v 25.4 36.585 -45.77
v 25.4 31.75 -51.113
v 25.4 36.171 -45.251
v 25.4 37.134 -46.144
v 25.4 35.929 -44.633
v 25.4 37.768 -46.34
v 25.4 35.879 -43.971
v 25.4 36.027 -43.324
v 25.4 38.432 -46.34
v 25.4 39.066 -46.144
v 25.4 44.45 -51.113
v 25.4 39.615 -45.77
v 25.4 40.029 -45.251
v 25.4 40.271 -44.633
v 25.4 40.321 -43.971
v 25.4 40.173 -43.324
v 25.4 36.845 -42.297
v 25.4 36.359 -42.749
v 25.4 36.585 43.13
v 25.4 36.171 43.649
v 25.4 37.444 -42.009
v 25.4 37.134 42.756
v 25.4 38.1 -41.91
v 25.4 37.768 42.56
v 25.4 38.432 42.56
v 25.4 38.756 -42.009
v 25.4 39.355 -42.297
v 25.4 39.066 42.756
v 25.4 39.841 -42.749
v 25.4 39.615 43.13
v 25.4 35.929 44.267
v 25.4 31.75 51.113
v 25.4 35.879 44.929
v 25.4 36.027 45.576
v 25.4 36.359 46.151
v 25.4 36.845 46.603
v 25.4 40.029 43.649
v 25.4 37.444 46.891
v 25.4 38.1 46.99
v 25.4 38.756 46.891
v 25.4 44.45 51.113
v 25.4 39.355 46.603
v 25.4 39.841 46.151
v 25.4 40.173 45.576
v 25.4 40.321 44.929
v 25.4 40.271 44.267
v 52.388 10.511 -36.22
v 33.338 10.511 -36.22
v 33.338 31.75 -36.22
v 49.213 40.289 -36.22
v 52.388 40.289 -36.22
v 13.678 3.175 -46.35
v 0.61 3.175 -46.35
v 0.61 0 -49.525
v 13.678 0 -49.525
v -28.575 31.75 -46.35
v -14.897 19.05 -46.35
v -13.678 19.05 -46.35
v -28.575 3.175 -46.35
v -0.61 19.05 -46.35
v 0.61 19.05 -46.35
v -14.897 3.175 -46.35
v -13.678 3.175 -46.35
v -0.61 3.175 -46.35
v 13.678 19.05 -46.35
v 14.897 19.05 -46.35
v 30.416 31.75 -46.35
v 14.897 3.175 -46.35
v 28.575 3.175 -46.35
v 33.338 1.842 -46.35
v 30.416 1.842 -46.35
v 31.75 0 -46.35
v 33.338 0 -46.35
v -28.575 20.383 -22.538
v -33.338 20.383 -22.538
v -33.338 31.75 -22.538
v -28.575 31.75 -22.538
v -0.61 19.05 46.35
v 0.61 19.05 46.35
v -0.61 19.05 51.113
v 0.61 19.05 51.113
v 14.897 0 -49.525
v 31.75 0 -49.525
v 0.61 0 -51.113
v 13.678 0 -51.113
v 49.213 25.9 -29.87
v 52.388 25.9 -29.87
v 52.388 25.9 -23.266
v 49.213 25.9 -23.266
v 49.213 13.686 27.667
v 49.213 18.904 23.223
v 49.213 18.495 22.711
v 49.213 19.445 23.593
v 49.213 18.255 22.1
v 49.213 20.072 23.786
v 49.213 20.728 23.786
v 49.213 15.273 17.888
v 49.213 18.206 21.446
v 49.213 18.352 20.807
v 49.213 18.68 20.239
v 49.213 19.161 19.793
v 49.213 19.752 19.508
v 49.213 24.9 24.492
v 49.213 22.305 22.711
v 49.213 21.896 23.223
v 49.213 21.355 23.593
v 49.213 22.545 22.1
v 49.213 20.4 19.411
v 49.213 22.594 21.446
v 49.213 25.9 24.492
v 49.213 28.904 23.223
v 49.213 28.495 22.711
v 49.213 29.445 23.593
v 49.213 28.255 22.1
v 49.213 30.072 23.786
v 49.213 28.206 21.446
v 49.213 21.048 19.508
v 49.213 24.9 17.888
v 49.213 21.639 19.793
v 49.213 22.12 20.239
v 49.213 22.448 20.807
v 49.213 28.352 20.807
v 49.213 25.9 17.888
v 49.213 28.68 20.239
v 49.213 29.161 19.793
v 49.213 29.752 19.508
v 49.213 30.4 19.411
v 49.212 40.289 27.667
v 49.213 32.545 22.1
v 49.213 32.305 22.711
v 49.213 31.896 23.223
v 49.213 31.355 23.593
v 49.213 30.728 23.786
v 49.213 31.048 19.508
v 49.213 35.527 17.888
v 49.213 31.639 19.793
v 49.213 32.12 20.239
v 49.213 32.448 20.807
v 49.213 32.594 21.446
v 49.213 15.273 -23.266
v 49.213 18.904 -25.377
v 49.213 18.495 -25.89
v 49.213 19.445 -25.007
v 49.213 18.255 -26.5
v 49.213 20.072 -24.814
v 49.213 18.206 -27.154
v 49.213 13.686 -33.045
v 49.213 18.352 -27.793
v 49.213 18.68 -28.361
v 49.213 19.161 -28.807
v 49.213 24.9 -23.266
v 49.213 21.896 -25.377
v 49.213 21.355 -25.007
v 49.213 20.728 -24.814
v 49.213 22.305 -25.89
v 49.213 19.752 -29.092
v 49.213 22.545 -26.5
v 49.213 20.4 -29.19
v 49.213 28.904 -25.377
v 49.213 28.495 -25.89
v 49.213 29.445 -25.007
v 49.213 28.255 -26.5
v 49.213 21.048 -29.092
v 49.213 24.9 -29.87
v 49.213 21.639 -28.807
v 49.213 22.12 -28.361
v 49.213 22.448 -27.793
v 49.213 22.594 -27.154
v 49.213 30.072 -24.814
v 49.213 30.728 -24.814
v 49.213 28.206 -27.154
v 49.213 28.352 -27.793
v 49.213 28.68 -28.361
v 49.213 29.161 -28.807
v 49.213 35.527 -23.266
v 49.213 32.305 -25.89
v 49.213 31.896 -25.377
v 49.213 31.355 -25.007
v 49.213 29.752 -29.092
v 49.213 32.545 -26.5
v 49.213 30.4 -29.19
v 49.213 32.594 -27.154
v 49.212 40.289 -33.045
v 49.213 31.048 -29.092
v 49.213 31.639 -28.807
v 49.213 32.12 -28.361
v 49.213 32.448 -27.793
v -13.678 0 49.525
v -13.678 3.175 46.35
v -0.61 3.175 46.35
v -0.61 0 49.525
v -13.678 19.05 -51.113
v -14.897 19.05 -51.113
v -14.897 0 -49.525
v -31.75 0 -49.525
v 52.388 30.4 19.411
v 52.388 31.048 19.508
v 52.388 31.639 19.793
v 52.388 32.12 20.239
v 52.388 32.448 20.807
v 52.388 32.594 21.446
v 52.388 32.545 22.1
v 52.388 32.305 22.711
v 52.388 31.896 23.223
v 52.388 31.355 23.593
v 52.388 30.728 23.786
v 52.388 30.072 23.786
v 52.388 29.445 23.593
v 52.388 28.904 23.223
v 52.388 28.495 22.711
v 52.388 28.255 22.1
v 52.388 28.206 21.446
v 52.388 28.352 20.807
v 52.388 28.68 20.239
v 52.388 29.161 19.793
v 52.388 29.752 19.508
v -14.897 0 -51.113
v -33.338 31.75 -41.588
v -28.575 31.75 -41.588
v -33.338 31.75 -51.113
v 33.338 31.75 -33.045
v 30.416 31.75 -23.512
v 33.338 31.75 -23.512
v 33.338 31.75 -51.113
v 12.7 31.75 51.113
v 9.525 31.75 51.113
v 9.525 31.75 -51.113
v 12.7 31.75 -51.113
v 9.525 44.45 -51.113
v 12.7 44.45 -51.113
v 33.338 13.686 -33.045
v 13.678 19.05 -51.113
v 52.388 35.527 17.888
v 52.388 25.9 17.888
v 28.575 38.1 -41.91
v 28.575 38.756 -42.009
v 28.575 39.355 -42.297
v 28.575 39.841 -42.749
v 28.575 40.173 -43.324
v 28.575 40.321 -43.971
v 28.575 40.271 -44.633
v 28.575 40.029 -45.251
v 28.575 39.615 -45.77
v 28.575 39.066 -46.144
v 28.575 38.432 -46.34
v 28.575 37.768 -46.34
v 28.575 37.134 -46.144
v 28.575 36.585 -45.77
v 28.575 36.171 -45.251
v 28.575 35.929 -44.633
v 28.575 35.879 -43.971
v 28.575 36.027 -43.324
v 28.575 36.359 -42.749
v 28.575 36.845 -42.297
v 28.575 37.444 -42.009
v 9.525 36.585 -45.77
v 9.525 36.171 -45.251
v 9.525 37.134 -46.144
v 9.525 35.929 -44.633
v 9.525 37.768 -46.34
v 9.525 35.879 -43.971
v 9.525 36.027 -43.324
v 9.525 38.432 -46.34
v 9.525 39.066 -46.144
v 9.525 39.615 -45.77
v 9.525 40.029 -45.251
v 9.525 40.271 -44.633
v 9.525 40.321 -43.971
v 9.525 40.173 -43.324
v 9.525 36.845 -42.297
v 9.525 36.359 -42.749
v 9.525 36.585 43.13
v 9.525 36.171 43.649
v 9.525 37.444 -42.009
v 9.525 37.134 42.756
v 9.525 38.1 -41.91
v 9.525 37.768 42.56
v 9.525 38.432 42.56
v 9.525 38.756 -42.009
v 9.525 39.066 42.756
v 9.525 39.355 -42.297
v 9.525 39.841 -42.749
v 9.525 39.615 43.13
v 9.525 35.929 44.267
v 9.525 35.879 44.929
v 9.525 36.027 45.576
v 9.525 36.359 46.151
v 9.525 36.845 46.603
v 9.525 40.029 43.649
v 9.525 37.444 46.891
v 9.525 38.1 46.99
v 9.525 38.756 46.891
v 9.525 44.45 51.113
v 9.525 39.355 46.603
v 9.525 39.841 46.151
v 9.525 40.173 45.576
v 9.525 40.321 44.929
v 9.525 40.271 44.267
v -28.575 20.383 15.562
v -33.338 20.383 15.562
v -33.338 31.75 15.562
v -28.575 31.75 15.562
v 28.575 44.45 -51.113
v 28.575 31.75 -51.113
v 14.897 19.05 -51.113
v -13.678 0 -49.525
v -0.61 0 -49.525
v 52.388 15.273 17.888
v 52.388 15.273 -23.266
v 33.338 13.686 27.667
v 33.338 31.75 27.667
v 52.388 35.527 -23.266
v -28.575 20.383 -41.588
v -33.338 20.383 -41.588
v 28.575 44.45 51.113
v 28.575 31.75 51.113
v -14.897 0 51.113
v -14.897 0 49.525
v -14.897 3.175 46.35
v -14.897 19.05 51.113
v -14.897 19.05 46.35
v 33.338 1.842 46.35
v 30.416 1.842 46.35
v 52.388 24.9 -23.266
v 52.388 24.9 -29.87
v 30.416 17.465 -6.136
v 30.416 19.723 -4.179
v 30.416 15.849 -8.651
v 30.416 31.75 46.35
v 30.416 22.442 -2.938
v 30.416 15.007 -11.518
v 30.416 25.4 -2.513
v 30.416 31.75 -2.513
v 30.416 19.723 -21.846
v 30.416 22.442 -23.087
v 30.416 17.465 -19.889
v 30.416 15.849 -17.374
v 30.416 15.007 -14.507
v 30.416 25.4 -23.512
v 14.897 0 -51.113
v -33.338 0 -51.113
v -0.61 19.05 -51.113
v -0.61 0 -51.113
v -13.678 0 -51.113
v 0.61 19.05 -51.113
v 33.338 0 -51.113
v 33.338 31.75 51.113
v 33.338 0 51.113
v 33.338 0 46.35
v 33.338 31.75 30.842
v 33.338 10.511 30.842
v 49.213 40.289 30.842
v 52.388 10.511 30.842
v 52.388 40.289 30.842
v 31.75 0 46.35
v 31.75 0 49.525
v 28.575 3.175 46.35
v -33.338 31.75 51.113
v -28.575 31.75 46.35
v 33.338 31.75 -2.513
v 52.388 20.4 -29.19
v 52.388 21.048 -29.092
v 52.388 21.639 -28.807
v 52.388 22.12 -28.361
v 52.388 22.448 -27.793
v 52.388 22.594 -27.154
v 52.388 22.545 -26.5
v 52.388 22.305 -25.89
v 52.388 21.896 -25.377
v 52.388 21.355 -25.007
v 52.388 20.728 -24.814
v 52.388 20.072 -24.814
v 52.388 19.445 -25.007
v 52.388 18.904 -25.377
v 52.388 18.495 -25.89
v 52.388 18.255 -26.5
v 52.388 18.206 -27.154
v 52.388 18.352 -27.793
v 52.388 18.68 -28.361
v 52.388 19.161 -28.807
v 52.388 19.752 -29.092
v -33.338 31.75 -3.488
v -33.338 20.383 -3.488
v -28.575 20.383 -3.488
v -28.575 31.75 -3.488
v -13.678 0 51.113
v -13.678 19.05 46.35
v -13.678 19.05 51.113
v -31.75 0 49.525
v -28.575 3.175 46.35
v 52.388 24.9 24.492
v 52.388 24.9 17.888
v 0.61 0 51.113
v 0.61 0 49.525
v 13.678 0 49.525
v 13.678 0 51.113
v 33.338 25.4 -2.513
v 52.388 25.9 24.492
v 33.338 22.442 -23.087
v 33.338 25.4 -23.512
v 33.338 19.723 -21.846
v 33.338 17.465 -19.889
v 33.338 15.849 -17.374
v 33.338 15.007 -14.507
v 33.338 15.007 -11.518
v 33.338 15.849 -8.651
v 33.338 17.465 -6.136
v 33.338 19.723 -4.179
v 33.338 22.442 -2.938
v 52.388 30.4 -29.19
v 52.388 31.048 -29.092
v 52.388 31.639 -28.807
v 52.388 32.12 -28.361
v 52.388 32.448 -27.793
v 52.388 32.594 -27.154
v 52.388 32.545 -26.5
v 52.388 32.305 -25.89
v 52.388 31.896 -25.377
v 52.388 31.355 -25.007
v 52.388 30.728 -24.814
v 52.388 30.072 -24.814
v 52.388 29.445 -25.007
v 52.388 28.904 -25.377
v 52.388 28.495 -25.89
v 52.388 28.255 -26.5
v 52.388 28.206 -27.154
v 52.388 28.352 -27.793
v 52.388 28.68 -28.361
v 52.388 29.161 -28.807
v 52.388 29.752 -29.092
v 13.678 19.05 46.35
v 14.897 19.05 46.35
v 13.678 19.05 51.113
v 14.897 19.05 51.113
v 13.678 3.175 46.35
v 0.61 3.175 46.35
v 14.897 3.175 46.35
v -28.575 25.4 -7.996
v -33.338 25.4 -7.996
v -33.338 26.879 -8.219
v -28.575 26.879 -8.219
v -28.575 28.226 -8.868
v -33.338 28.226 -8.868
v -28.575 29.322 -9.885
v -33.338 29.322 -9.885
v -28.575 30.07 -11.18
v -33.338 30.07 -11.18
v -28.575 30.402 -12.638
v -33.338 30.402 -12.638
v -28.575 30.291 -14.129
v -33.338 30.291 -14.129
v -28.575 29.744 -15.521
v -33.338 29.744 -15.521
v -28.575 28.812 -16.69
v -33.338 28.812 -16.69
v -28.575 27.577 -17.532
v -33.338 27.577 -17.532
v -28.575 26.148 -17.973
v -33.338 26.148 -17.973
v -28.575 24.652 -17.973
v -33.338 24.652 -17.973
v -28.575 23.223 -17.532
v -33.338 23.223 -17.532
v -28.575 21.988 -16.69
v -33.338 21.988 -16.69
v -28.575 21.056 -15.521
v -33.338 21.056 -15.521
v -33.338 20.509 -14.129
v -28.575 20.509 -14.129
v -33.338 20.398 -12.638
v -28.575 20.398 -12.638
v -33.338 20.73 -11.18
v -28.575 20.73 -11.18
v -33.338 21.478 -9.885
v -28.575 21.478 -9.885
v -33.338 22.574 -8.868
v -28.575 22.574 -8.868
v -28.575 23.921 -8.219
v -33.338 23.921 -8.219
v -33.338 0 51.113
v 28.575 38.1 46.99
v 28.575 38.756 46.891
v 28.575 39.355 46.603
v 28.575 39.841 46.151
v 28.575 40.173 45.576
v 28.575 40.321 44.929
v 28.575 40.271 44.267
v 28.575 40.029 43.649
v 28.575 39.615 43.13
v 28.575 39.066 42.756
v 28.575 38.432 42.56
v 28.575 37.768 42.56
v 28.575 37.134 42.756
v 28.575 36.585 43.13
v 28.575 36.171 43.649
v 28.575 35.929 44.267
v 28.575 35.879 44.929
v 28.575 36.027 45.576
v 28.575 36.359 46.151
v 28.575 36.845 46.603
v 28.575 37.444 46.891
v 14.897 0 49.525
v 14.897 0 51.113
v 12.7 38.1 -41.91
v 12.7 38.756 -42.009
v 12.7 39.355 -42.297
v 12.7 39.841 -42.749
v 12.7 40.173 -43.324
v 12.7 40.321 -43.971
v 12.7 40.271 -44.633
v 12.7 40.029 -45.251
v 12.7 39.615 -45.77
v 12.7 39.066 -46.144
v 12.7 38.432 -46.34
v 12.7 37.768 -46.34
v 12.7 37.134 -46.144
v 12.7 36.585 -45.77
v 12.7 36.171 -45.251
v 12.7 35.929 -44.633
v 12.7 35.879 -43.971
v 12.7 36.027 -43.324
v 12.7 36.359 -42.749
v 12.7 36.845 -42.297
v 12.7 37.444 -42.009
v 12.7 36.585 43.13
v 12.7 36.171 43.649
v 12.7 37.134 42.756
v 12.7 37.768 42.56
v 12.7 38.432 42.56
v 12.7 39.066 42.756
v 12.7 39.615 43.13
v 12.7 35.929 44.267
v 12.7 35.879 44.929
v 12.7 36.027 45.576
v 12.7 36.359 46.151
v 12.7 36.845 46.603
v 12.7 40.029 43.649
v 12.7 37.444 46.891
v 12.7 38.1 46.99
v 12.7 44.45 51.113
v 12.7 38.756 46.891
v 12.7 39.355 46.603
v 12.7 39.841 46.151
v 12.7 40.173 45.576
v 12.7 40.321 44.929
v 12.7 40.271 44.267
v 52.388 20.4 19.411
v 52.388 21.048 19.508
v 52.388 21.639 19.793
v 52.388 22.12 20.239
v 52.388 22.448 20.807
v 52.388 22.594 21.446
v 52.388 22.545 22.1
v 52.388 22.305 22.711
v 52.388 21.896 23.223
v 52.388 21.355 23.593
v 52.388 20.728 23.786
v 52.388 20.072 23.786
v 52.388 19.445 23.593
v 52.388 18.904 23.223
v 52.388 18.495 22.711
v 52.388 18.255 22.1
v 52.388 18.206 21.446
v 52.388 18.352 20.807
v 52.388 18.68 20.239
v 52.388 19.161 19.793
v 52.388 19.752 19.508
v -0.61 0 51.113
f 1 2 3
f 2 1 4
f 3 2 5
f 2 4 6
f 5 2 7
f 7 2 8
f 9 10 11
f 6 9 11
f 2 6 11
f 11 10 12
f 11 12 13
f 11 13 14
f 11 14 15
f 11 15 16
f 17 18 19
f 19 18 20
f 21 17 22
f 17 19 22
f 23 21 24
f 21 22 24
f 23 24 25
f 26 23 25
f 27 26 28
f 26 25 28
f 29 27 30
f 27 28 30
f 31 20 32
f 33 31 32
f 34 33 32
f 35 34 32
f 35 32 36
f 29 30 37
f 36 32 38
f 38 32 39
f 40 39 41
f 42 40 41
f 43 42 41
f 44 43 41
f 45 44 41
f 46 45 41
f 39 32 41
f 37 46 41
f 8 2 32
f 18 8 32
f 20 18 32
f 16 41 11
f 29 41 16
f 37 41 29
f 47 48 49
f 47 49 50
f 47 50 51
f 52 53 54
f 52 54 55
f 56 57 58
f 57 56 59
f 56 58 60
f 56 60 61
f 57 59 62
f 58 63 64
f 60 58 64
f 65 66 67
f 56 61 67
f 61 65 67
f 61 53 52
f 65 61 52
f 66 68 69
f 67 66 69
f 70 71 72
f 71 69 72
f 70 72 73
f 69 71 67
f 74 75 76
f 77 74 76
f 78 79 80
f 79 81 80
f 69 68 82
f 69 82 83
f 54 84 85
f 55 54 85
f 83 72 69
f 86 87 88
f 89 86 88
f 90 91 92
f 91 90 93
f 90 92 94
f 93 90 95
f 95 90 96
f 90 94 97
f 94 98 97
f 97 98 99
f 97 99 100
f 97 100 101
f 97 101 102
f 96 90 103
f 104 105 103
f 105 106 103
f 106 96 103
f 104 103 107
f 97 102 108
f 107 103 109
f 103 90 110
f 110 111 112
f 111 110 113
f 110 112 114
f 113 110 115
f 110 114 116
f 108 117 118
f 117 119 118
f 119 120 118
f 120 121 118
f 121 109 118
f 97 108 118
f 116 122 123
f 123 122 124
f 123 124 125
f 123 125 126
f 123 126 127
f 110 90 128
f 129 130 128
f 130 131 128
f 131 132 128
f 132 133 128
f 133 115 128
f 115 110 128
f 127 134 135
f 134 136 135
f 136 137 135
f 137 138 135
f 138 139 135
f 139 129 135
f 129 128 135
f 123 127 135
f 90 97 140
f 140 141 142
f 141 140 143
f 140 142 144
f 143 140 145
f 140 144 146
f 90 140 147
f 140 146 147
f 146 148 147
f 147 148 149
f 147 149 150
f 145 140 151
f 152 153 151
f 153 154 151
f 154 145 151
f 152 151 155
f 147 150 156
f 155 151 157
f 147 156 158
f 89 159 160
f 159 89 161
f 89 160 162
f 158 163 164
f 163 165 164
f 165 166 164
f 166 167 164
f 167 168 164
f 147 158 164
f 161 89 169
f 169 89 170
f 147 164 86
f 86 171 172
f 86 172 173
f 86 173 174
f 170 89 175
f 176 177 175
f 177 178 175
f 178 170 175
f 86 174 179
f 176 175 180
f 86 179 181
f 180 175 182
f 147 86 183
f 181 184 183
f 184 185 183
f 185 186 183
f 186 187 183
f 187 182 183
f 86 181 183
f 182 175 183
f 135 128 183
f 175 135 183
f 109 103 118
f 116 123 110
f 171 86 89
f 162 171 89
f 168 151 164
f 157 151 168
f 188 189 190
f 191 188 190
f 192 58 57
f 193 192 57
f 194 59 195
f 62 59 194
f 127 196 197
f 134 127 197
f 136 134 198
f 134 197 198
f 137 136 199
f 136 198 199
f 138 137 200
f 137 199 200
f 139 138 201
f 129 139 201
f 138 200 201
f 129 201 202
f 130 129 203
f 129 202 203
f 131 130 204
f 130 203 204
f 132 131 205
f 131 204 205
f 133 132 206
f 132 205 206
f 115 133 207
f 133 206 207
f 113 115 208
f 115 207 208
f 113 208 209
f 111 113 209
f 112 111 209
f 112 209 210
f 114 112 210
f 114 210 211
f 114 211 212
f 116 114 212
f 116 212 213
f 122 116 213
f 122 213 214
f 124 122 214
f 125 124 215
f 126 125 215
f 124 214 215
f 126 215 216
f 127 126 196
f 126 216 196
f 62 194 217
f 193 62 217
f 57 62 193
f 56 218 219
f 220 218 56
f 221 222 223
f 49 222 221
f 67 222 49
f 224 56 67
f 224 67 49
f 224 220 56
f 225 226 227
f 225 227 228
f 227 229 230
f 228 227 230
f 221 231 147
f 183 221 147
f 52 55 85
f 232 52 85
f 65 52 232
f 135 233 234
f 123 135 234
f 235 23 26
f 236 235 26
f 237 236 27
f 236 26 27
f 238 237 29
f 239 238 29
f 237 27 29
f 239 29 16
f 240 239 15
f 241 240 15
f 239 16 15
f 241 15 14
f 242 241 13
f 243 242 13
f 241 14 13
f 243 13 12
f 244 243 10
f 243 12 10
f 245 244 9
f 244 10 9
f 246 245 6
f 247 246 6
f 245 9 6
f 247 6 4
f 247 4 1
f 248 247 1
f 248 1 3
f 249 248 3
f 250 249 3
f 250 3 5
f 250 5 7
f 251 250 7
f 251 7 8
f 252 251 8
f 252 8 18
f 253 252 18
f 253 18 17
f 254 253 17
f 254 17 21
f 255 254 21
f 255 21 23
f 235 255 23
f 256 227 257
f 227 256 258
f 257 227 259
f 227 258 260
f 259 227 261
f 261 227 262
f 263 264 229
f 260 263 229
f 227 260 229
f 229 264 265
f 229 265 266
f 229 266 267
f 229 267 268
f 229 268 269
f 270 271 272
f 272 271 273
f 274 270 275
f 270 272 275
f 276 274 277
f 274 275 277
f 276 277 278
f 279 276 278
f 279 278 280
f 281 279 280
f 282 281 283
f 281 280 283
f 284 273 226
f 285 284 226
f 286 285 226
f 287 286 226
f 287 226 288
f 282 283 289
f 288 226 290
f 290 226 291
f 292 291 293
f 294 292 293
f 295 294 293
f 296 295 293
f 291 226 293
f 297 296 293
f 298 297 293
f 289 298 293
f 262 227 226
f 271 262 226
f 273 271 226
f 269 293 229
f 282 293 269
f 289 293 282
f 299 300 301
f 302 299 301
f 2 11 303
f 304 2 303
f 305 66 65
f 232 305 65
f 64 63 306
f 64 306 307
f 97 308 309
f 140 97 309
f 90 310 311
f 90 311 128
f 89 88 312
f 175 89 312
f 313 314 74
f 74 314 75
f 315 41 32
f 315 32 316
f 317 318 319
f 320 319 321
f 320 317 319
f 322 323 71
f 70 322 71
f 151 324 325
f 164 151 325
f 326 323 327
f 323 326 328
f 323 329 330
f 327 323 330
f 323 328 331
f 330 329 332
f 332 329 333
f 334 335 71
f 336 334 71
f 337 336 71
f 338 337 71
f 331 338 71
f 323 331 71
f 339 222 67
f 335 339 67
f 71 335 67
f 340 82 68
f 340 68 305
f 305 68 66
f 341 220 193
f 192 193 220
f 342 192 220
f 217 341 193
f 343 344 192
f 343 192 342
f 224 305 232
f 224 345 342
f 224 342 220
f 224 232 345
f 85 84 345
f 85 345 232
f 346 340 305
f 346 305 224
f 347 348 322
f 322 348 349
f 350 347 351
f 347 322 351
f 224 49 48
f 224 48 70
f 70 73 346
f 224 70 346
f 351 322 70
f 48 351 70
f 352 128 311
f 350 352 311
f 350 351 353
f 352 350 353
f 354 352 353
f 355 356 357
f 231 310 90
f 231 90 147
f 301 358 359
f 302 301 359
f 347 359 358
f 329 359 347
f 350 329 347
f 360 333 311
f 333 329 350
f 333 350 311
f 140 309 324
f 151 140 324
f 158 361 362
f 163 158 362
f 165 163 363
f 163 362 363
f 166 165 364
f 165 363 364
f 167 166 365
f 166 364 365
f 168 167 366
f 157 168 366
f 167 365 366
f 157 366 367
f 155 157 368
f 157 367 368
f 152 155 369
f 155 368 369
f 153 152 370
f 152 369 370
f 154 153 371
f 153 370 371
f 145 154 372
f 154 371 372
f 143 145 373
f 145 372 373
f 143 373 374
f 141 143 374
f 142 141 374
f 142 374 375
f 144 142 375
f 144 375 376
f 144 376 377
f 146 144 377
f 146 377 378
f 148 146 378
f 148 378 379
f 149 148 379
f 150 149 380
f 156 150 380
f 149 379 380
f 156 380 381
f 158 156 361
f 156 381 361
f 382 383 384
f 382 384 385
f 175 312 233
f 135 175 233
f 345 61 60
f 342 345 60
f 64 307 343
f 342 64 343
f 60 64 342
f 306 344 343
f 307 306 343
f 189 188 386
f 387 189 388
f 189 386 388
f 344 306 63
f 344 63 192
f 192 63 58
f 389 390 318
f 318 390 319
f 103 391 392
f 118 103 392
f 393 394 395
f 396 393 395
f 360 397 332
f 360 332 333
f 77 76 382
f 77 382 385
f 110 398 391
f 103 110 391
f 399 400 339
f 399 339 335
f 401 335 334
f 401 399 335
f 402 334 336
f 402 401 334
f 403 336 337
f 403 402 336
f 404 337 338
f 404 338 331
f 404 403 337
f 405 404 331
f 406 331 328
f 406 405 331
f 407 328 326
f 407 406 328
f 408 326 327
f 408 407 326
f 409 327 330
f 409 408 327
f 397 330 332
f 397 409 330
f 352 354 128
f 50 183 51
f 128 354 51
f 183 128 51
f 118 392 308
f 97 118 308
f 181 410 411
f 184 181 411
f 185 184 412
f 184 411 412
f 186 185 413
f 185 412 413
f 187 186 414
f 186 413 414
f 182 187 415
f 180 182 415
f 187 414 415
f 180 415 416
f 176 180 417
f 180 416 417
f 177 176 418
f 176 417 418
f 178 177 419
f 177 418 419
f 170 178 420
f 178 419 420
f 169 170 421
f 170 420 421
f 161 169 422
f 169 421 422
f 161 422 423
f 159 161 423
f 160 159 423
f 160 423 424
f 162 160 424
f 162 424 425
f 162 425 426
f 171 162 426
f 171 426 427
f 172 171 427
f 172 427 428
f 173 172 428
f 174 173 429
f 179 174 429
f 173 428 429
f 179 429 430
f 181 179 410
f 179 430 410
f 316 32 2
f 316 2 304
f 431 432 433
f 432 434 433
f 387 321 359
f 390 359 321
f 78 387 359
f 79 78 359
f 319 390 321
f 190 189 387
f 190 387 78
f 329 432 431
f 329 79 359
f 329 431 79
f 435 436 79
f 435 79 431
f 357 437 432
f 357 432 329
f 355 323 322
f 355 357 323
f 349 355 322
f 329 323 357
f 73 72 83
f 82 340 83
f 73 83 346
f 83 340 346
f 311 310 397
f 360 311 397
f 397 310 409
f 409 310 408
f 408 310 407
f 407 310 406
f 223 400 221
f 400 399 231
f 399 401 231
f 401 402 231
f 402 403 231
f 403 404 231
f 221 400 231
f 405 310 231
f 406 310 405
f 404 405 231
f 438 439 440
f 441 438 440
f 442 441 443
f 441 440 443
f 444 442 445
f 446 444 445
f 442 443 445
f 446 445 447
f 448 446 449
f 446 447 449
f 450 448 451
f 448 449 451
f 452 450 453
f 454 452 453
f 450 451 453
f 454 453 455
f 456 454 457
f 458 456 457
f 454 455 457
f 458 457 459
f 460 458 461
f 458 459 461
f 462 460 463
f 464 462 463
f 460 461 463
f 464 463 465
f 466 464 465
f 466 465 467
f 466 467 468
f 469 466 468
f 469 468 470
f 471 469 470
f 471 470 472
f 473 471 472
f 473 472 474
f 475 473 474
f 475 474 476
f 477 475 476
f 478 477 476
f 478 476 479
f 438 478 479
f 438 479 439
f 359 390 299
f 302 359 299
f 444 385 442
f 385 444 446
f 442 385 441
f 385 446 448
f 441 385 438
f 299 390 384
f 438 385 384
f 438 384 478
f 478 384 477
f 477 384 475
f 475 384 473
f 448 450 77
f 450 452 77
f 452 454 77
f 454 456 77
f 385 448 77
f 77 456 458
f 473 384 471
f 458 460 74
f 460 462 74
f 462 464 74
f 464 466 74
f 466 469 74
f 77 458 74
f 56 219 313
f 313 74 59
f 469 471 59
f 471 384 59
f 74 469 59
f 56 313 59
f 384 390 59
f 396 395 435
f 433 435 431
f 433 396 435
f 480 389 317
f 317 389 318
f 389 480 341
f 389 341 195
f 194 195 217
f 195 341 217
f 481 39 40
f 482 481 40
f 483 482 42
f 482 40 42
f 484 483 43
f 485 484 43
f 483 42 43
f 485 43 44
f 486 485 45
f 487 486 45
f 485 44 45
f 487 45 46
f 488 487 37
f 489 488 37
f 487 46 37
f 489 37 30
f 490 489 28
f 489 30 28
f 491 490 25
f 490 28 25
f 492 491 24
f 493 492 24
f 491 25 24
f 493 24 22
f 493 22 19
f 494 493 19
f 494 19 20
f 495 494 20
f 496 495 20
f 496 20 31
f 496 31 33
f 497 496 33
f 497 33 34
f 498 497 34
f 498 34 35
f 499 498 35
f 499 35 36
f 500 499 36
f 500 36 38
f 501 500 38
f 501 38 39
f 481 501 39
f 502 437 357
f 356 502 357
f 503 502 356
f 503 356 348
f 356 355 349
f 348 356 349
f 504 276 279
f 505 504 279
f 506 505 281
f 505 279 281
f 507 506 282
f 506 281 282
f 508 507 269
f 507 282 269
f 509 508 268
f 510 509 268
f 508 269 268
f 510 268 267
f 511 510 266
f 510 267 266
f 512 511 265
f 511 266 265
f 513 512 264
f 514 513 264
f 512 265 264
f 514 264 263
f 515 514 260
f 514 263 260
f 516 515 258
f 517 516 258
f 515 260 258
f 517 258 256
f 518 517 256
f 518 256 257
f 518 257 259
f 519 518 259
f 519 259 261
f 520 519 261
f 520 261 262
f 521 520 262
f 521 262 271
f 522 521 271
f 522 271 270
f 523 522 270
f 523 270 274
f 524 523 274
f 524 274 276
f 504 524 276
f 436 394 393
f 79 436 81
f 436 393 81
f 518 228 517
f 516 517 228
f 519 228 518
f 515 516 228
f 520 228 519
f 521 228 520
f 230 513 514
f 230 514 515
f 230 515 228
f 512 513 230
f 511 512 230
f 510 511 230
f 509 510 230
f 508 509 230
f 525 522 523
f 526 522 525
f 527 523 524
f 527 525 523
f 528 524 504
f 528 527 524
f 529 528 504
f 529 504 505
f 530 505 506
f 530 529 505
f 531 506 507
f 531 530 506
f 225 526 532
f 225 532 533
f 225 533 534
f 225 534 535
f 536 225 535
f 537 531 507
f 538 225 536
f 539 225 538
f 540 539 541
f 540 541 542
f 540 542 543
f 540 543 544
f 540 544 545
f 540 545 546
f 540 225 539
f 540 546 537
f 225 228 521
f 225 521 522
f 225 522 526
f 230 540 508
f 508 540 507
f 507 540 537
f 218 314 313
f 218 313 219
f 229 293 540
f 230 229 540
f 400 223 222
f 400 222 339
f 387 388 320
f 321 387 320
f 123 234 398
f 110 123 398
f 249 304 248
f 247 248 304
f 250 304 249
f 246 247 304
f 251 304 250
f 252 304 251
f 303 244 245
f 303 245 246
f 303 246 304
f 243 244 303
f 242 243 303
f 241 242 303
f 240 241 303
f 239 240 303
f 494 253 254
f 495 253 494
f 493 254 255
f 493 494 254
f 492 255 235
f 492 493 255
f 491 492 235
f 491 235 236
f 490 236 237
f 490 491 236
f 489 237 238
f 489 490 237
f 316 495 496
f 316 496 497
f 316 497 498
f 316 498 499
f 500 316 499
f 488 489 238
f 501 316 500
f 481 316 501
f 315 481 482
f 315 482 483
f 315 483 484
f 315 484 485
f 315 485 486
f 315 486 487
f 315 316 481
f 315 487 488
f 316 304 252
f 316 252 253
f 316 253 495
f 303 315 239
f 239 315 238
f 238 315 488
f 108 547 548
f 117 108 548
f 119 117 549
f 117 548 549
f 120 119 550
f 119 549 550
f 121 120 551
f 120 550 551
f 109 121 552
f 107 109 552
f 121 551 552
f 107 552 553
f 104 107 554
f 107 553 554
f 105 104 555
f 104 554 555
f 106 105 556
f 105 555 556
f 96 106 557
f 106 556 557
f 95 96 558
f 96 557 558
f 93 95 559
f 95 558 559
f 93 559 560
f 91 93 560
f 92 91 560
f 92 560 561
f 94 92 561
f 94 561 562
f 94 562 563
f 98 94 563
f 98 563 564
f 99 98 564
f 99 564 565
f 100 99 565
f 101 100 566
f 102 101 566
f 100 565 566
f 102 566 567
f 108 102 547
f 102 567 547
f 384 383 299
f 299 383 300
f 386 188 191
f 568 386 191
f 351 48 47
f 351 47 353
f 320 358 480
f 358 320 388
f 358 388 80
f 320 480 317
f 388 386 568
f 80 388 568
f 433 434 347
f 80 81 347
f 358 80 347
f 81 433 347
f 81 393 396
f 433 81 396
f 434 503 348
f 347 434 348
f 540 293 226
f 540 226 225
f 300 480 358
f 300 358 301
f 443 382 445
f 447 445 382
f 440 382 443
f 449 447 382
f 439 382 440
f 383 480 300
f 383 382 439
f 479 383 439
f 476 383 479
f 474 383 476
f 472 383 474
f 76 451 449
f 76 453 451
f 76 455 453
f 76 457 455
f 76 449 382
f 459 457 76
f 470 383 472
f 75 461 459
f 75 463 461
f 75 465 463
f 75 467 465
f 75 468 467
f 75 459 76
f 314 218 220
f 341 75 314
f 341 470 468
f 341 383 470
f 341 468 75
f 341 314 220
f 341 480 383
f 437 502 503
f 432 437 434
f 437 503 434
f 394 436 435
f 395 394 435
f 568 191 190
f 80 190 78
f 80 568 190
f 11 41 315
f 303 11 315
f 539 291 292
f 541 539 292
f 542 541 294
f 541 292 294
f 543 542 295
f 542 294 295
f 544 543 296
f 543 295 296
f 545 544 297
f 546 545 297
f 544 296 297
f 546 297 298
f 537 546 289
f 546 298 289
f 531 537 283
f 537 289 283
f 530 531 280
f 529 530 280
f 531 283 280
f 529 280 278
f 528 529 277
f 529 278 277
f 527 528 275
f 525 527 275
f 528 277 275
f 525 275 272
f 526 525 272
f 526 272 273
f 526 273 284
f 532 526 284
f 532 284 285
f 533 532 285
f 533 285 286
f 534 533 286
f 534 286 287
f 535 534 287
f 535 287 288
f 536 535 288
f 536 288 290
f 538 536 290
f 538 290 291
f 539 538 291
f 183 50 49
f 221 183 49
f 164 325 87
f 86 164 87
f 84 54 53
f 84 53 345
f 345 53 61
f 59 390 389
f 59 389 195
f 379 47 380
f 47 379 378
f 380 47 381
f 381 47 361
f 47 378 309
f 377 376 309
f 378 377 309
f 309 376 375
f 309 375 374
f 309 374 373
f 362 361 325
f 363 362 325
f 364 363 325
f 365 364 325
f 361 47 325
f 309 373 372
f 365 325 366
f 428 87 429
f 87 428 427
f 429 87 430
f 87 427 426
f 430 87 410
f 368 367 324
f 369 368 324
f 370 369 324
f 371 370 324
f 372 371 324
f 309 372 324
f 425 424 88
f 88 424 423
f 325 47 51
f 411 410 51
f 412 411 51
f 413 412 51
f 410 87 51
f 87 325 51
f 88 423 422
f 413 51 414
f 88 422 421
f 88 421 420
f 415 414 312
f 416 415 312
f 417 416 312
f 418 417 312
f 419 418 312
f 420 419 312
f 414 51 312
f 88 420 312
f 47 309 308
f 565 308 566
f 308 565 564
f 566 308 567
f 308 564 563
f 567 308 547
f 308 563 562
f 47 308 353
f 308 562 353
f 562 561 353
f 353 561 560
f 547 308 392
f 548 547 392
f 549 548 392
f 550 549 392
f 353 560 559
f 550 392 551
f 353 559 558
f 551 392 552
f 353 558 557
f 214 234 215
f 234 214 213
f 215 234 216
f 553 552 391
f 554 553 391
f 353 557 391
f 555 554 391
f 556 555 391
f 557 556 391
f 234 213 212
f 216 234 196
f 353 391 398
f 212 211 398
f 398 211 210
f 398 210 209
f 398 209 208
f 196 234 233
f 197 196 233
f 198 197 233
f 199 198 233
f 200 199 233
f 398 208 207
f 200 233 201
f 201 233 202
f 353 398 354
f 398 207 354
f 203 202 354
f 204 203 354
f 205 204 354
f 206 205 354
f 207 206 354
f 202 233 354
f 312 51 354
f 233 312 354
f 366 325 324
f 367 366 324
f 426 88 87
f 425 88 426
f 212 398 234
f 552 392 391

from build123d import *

# Parameters (mm, degrees)
SKETCH4_W               = 66.675
SKETCH4_H               = 102.22500002
SKETCH4_W_2             = 57.15
SKETCH4_H_2             = 92.70000002
BOSS_EXTRUDE1_DEPTH     = 19.05
BOSS_EXTRUDE2_START     = 19.05
SKETCH5_W               = 66.675
SKETCH5_H               = 102.22500002
BOSS_EXTRUDE2_DEPTH     = 12.7
FILLET1_SIZE            = 3.175
SKETCH6_W               = 1.2192
SKETCH6_H               = 19.05
CUT_EXTRUDE_THIN1_DEPTH = 118.182461581
SKETCH8_W               = 3.175
SKETCH8_H               = 12.7
BOSS_EXTRUDE3_DEPTH     = 102.22500002
BOSS_EXTRUDE3_2_DEPTH   = 102.22500002
SKETCH9_R               = 2.226999991
CUT_EXTRUDE2_DEPTH      = 81.159117158
SKETCH14_W              = 57.15
SKETCH14_H              = 92.70000002
CUT_EXTRUDE8_DEPTH      = 12.7
SKETCH26_W              = 1.8415
SKETCH26_H              = 92.70000002
CUT_EXTRUDE11_DEPTH     = 69.789091167
CUT_EXTRUDE12_START     = -2.921
SKETCH27_W              = 92.70000002
SKETCH27_H              = 1.8415
CUT_EXTRUDE12_DEPTH     = 2.921
SKETCH30_R              = 5.0165
CUT_EXTRUDE13_DEPTH     = 96.046545346
CUT_EXTRUDE16_DEPTH     = 2.921
BOSS_EXTRUDE4_DEPTH     = 19.05
SKETCH34_W              = 67.061999988
SKETCH34_H              = 29.778999878
BOSS_EXTRUDE5_DEPTH     = 3.175
CUT_EXTRUDE17_START     = 19.05
SKETCH32_R              = 2.200000045
CUT_EXTRUDE17_DEPTH     = 3.175
BOSS_EXTRUDE6_DEPTH     = 3.175
BOSS_EXTRUDE8_START     = 27.666500001
BOSS_EXTRUDE8_DEPTH     = 3.175
SKETCH36_W              = 19.05
SKETCH36_H              = 11.3665
CUT_EXTRUDE18_DEPTH     = 4.7625


# Read off the part's stored shape, not the designer's step: Boss-Extrude8
with BuildPart() as part:
    # Sketch4 → Boss-Extrude1 (new body)
    with BuildSketch(Plane(origin=(0, 0, 0), x_dir=(1, 0, 0), z_dir=(0, 1, 0))):
        Rectangle(SKETCH4_W, SKETCH4_H)
        Rectangle(SKETCH4_W_2, SKETCH4_H_2, mode=Mode.SUBTRACT)
    extrude(amount=BOSS_EXTRUDE1_DEPTH)

    # Sketch5 → Boss-Extrude2 (add)
    with BuildSketch(Plane(origin=(0, 0, 0), x_dir=(1, 0, 0), z_dir=(0, 1, 0)).offset(BOSS_EXTRUDE2_START)):
        Rectangle(SKETCH5_W, SKETCH5_H)
    extrude(amount=BOSS_EXTRUDE2_DEPTH)

    # Fillet1
    fillet1_edges = [part.edges().sort_by_distance(p)[0] for p in [
        (-28.575, 0, 0),
        (0, 0, 46.35000001),
        (28.575, 0, 0),
        (0, 0, -46.35000001),
    ]]
    chamfer(fillet1_edges, length=FILLET1_SIZE)

    # Sketch6 → Cut-Extrude-Thin1 (cut, through all)
    with BuildSketch(Plane(origin=(14.34600001, 0, 51.11250001), x_dir=(-1, 0, 0), z_dir=(0, 0, -1))):
        with Locations((14.34600001, 9.525)):
            Rectangle(SKETCH6_W, SKETCH6_H)
        with Locations((28.63350001, 9.525)):
            Rectangle(SKETCH6_W, SKETCH6_H)
        with Locations((0.05850001, 9.525)):
            Rectangle(SKETCH6_W, SKETCH6_H)
    extrude(amount=CUT_EXTRUDE_THIN1_DEPTH, mode=Mode.SUBTRACT)

    # Sketch14 → Cut-Extrude8 (cut)
    with BuildSketch(Plane.XZ.offset(-19.05)):
        Rectangle(SKETCH14_W, SKETCH14_H)
    extrude(amount=-CUT_EXTRUDE8_DEPTH, mode=Mode.SUBTRACT)

    # Sketch26 → Cut-Extrude11 (cut, through all)
    with BuildSketch(Plane(origin=(0, 31.75, 0), x_dir=(1, 0, 0), z_dir=(0, 1, 0))):
        with Locations((29.49575, 0)):
            Rectangle(SKETCH26_W, SKETCH26_H)
    extrude(amount=-CUT_EXTRUDE11_DEPTH, mode=Mode.SUBTRACT)

    # Sketch27 → Cut-Extrude12 (cut)
    with BuildSketch(Plane(origin=(33.3375, 0, 0), x_dir=(0, 0, -1), z_dir=(1, 0, 0)).offset(CUT_EXTRUDE12_START)):
        with Locations((0, 0.92075)):
            Rectangle(SKETCH27_W, SKETCH27_H)
    extrude(amount=CUT_EXTRUDE12_DEPTH, mode=Mode.SUBTRACT)

    # Sketch30 → Cut-Extrude13 (cut, through all)
    with BuildSketch(Plane.ZY.offset(33.3375)):
        with Locations((-13.01250001, 25.4)):
            Circle(SKETCH30_R)
    extrude(amount=-CUT_EXTRUDE13_DEPTH, mode=Mode.SUBTRACT)

    # Sketch31 → Cut-Extrude16 (cut)
    with BuildSketch(Plane(origin=(33.3375, 0, 0), x_dir=(0, 0, -1), z_dir=(1, 0, 0))):
        with BuildLine():
            Line((2.512500055, 25.4), (2.512500055, 31.75))
            Line((2.512500055, 31.75), (23.512499965, 31.75))
            Line((23.512499965, 31.75), (23.512499965, 25.4))
            ThreePointArc((23.512499965, 25.4), (13.01250001, 14.900000045), (2.512500055, 25.4))
        make_face()
    extrude(amount=-CUT_EXTRUDE16_DEPTH, mode=Mode.SUBTRACT)

    # Sketch33 → Boss-Extrude4 (add)
    with BuildSketch(Plane(origin=(33.3375, 0, 0), x_dir=(0, 0, -1), z_dir=(1, 0, 0))):
        Polygon((-27.666500001, 31.75), (-27.666500001, 13.685500057), (33.045499987, 13.685500057), (33.045499987, 31.75), (36.220499987, 31.75), (36.220499987, 10.510500057), (-30.841500001, 10.510500057), (-30.841500001, 31.75), align=None)
    extrude(amount=BOSS_EXTRUDE4_DEPTH)

    # Sketch34 → Boss-Extrude5 (add)
    with BuildSketch(Plane(origin=(52.3875, 0, 0), x_dir=(0, 0, -1), z_dir=(1, 0, 0))):
        with Locations((2.689499993, 25.399999996)):
            Rectangle(SKETCH34_W, SKETCH34_H)
    extrude(amount=-BOSS_EXTRUDE5_DEPTH)

    # Sketch32 → Cut-Extrude17 (cut)
    with BuildSketch(Plane(origin=(33.3375, 0, 0), x_dir=(0, 0, -1), z_dir=(1, 0, 0)).offset(CUT_EXTRUDE17_START)):
        with Locations((26.989500034, 30.400000029)):
            Circle(SKETCH32_R)
        with Locations((26.989500034, 20.399999963)):
            Circle(SKETCH32_R)
        with Locations((-21.610500048, 30.400000029)):
            Circle(SKETCH32_R)
        with Locations((-21.610500048, 20.399999963)):
            Circle(SKETCH32_R)
        Polygon((23.266499987, 15.273000057), (23.266499987, 24.899999996), (29.870499987, 24.899999996), (29.870499987, 25.899999996), (23.266499987, 25.899999996), (23.266499987, 35.526999935), (-17.887500001, 35.526999935), (-17.887500001, 25.899999996), (-24.491500001, 25.899999996), (-24.491500001, 24.899999996), (-17.887500001, 24.899999996), (-17.887500001, 15.273000057), align=None)
    extrude(amount=-CUT_EXTRUDE17_DEPTH, mode=Mode.SUBTRACT)

    # Sketch35 → Boss-Extrude6 (add)
    with BuildSketch(Plane(origin=(0, 0, -36.220499987), x_dir=(-1, 0, 0), z_dir=(0, 0, -1))):
        Polygon((-49.2125, 40.289499935), (-33.3375, 31.75), (-49.2125, 31.75), align=None)
    extrude(amount=-BOSS_EXTRUDE6_DEPTH)

    # Boss-Extrude8 outline → Boss-Extrude8 (add)
    with BuildSketch(Plane.XY.offset(BOSS_EXTRUDE8_START)):
        Polygon((49.2125, 40.289499935), (33.3375, 31.75), (49.2125, 31.75), align=None)
    extrude(amount=BOSS_EXTRUDE8_DEPTH)

    # Sketch36 → Cut-Extrude18 (cut)
    with BuildSketch(Plane.ZY.offset(33.3375)):
        with Locations((6.03749999, 26.06675)):
            Rectangle(SKETCH36_W, SKETCH36_H)
        with Locations((-32.06250001, 26.06675)):
            Rectangle(SKETCH36_W, SKETCH36_H)
    extrude(amount=-CUT_EXTRUDE18_DEPTH, mode=Mode.SUBTRACT)


with BuildPart() as body_2:
    # Sketch8 → Boss-Extrude3 (new body)
    with BuildSketch(Plane.XY.offset(51.11250001)):
        with Locations((11.1125, 38.1)):
            Rectangle(SKETCH8_W, SKETCH8_H)
    extrude(amount=-BOSS_EXTRUDE3_DEPTH)


with BuildPart() as body_3:
    # Sketch8 → Boss-Extrude3 2 (new body)
    with BuildSketch(Plane.XY.offset(51.11250001)):
        with Locations((26.9875, 38.1)):
            Rectangle(SKETCH8_W, SKETCH8_H)
    extrude(amount=-BOSS_EXTRUDE3_2_DEPTH)


with BuildPart() as cut_extrude2_tool:
    # Sketch9 → Cut-Extrude2 (new, through all)
    with BuildSketch(Plane.ZY.offset(-9.525)):
        with Locations((44.76250001, 38.1)):
            Circle(SKETCH9_R)
        with Locations((-44.13749999, 38.1)):
            Circle(SKETCH9_R)
    extrude(amount=-CUT_EXTRUDE2_DEPTH)


with BuildPart() as body_2_1:
    add(body_2.part)

    # Cut-Extrude2: cut by cut_extrude2_tool
    add(cut_extrude2_tool.part, mode=Mode.SUBTRACT)


with BuildPart() as body_3_1:
    add(body_3.part)

    # Cut-Extrude2: cut by cut_extrude2_tool
    add(cut_extrude2_tool.part, mode=Mode.SUBTRACT)


solid = Compound([part.part, body_2_1.part, body_3_1.part])
